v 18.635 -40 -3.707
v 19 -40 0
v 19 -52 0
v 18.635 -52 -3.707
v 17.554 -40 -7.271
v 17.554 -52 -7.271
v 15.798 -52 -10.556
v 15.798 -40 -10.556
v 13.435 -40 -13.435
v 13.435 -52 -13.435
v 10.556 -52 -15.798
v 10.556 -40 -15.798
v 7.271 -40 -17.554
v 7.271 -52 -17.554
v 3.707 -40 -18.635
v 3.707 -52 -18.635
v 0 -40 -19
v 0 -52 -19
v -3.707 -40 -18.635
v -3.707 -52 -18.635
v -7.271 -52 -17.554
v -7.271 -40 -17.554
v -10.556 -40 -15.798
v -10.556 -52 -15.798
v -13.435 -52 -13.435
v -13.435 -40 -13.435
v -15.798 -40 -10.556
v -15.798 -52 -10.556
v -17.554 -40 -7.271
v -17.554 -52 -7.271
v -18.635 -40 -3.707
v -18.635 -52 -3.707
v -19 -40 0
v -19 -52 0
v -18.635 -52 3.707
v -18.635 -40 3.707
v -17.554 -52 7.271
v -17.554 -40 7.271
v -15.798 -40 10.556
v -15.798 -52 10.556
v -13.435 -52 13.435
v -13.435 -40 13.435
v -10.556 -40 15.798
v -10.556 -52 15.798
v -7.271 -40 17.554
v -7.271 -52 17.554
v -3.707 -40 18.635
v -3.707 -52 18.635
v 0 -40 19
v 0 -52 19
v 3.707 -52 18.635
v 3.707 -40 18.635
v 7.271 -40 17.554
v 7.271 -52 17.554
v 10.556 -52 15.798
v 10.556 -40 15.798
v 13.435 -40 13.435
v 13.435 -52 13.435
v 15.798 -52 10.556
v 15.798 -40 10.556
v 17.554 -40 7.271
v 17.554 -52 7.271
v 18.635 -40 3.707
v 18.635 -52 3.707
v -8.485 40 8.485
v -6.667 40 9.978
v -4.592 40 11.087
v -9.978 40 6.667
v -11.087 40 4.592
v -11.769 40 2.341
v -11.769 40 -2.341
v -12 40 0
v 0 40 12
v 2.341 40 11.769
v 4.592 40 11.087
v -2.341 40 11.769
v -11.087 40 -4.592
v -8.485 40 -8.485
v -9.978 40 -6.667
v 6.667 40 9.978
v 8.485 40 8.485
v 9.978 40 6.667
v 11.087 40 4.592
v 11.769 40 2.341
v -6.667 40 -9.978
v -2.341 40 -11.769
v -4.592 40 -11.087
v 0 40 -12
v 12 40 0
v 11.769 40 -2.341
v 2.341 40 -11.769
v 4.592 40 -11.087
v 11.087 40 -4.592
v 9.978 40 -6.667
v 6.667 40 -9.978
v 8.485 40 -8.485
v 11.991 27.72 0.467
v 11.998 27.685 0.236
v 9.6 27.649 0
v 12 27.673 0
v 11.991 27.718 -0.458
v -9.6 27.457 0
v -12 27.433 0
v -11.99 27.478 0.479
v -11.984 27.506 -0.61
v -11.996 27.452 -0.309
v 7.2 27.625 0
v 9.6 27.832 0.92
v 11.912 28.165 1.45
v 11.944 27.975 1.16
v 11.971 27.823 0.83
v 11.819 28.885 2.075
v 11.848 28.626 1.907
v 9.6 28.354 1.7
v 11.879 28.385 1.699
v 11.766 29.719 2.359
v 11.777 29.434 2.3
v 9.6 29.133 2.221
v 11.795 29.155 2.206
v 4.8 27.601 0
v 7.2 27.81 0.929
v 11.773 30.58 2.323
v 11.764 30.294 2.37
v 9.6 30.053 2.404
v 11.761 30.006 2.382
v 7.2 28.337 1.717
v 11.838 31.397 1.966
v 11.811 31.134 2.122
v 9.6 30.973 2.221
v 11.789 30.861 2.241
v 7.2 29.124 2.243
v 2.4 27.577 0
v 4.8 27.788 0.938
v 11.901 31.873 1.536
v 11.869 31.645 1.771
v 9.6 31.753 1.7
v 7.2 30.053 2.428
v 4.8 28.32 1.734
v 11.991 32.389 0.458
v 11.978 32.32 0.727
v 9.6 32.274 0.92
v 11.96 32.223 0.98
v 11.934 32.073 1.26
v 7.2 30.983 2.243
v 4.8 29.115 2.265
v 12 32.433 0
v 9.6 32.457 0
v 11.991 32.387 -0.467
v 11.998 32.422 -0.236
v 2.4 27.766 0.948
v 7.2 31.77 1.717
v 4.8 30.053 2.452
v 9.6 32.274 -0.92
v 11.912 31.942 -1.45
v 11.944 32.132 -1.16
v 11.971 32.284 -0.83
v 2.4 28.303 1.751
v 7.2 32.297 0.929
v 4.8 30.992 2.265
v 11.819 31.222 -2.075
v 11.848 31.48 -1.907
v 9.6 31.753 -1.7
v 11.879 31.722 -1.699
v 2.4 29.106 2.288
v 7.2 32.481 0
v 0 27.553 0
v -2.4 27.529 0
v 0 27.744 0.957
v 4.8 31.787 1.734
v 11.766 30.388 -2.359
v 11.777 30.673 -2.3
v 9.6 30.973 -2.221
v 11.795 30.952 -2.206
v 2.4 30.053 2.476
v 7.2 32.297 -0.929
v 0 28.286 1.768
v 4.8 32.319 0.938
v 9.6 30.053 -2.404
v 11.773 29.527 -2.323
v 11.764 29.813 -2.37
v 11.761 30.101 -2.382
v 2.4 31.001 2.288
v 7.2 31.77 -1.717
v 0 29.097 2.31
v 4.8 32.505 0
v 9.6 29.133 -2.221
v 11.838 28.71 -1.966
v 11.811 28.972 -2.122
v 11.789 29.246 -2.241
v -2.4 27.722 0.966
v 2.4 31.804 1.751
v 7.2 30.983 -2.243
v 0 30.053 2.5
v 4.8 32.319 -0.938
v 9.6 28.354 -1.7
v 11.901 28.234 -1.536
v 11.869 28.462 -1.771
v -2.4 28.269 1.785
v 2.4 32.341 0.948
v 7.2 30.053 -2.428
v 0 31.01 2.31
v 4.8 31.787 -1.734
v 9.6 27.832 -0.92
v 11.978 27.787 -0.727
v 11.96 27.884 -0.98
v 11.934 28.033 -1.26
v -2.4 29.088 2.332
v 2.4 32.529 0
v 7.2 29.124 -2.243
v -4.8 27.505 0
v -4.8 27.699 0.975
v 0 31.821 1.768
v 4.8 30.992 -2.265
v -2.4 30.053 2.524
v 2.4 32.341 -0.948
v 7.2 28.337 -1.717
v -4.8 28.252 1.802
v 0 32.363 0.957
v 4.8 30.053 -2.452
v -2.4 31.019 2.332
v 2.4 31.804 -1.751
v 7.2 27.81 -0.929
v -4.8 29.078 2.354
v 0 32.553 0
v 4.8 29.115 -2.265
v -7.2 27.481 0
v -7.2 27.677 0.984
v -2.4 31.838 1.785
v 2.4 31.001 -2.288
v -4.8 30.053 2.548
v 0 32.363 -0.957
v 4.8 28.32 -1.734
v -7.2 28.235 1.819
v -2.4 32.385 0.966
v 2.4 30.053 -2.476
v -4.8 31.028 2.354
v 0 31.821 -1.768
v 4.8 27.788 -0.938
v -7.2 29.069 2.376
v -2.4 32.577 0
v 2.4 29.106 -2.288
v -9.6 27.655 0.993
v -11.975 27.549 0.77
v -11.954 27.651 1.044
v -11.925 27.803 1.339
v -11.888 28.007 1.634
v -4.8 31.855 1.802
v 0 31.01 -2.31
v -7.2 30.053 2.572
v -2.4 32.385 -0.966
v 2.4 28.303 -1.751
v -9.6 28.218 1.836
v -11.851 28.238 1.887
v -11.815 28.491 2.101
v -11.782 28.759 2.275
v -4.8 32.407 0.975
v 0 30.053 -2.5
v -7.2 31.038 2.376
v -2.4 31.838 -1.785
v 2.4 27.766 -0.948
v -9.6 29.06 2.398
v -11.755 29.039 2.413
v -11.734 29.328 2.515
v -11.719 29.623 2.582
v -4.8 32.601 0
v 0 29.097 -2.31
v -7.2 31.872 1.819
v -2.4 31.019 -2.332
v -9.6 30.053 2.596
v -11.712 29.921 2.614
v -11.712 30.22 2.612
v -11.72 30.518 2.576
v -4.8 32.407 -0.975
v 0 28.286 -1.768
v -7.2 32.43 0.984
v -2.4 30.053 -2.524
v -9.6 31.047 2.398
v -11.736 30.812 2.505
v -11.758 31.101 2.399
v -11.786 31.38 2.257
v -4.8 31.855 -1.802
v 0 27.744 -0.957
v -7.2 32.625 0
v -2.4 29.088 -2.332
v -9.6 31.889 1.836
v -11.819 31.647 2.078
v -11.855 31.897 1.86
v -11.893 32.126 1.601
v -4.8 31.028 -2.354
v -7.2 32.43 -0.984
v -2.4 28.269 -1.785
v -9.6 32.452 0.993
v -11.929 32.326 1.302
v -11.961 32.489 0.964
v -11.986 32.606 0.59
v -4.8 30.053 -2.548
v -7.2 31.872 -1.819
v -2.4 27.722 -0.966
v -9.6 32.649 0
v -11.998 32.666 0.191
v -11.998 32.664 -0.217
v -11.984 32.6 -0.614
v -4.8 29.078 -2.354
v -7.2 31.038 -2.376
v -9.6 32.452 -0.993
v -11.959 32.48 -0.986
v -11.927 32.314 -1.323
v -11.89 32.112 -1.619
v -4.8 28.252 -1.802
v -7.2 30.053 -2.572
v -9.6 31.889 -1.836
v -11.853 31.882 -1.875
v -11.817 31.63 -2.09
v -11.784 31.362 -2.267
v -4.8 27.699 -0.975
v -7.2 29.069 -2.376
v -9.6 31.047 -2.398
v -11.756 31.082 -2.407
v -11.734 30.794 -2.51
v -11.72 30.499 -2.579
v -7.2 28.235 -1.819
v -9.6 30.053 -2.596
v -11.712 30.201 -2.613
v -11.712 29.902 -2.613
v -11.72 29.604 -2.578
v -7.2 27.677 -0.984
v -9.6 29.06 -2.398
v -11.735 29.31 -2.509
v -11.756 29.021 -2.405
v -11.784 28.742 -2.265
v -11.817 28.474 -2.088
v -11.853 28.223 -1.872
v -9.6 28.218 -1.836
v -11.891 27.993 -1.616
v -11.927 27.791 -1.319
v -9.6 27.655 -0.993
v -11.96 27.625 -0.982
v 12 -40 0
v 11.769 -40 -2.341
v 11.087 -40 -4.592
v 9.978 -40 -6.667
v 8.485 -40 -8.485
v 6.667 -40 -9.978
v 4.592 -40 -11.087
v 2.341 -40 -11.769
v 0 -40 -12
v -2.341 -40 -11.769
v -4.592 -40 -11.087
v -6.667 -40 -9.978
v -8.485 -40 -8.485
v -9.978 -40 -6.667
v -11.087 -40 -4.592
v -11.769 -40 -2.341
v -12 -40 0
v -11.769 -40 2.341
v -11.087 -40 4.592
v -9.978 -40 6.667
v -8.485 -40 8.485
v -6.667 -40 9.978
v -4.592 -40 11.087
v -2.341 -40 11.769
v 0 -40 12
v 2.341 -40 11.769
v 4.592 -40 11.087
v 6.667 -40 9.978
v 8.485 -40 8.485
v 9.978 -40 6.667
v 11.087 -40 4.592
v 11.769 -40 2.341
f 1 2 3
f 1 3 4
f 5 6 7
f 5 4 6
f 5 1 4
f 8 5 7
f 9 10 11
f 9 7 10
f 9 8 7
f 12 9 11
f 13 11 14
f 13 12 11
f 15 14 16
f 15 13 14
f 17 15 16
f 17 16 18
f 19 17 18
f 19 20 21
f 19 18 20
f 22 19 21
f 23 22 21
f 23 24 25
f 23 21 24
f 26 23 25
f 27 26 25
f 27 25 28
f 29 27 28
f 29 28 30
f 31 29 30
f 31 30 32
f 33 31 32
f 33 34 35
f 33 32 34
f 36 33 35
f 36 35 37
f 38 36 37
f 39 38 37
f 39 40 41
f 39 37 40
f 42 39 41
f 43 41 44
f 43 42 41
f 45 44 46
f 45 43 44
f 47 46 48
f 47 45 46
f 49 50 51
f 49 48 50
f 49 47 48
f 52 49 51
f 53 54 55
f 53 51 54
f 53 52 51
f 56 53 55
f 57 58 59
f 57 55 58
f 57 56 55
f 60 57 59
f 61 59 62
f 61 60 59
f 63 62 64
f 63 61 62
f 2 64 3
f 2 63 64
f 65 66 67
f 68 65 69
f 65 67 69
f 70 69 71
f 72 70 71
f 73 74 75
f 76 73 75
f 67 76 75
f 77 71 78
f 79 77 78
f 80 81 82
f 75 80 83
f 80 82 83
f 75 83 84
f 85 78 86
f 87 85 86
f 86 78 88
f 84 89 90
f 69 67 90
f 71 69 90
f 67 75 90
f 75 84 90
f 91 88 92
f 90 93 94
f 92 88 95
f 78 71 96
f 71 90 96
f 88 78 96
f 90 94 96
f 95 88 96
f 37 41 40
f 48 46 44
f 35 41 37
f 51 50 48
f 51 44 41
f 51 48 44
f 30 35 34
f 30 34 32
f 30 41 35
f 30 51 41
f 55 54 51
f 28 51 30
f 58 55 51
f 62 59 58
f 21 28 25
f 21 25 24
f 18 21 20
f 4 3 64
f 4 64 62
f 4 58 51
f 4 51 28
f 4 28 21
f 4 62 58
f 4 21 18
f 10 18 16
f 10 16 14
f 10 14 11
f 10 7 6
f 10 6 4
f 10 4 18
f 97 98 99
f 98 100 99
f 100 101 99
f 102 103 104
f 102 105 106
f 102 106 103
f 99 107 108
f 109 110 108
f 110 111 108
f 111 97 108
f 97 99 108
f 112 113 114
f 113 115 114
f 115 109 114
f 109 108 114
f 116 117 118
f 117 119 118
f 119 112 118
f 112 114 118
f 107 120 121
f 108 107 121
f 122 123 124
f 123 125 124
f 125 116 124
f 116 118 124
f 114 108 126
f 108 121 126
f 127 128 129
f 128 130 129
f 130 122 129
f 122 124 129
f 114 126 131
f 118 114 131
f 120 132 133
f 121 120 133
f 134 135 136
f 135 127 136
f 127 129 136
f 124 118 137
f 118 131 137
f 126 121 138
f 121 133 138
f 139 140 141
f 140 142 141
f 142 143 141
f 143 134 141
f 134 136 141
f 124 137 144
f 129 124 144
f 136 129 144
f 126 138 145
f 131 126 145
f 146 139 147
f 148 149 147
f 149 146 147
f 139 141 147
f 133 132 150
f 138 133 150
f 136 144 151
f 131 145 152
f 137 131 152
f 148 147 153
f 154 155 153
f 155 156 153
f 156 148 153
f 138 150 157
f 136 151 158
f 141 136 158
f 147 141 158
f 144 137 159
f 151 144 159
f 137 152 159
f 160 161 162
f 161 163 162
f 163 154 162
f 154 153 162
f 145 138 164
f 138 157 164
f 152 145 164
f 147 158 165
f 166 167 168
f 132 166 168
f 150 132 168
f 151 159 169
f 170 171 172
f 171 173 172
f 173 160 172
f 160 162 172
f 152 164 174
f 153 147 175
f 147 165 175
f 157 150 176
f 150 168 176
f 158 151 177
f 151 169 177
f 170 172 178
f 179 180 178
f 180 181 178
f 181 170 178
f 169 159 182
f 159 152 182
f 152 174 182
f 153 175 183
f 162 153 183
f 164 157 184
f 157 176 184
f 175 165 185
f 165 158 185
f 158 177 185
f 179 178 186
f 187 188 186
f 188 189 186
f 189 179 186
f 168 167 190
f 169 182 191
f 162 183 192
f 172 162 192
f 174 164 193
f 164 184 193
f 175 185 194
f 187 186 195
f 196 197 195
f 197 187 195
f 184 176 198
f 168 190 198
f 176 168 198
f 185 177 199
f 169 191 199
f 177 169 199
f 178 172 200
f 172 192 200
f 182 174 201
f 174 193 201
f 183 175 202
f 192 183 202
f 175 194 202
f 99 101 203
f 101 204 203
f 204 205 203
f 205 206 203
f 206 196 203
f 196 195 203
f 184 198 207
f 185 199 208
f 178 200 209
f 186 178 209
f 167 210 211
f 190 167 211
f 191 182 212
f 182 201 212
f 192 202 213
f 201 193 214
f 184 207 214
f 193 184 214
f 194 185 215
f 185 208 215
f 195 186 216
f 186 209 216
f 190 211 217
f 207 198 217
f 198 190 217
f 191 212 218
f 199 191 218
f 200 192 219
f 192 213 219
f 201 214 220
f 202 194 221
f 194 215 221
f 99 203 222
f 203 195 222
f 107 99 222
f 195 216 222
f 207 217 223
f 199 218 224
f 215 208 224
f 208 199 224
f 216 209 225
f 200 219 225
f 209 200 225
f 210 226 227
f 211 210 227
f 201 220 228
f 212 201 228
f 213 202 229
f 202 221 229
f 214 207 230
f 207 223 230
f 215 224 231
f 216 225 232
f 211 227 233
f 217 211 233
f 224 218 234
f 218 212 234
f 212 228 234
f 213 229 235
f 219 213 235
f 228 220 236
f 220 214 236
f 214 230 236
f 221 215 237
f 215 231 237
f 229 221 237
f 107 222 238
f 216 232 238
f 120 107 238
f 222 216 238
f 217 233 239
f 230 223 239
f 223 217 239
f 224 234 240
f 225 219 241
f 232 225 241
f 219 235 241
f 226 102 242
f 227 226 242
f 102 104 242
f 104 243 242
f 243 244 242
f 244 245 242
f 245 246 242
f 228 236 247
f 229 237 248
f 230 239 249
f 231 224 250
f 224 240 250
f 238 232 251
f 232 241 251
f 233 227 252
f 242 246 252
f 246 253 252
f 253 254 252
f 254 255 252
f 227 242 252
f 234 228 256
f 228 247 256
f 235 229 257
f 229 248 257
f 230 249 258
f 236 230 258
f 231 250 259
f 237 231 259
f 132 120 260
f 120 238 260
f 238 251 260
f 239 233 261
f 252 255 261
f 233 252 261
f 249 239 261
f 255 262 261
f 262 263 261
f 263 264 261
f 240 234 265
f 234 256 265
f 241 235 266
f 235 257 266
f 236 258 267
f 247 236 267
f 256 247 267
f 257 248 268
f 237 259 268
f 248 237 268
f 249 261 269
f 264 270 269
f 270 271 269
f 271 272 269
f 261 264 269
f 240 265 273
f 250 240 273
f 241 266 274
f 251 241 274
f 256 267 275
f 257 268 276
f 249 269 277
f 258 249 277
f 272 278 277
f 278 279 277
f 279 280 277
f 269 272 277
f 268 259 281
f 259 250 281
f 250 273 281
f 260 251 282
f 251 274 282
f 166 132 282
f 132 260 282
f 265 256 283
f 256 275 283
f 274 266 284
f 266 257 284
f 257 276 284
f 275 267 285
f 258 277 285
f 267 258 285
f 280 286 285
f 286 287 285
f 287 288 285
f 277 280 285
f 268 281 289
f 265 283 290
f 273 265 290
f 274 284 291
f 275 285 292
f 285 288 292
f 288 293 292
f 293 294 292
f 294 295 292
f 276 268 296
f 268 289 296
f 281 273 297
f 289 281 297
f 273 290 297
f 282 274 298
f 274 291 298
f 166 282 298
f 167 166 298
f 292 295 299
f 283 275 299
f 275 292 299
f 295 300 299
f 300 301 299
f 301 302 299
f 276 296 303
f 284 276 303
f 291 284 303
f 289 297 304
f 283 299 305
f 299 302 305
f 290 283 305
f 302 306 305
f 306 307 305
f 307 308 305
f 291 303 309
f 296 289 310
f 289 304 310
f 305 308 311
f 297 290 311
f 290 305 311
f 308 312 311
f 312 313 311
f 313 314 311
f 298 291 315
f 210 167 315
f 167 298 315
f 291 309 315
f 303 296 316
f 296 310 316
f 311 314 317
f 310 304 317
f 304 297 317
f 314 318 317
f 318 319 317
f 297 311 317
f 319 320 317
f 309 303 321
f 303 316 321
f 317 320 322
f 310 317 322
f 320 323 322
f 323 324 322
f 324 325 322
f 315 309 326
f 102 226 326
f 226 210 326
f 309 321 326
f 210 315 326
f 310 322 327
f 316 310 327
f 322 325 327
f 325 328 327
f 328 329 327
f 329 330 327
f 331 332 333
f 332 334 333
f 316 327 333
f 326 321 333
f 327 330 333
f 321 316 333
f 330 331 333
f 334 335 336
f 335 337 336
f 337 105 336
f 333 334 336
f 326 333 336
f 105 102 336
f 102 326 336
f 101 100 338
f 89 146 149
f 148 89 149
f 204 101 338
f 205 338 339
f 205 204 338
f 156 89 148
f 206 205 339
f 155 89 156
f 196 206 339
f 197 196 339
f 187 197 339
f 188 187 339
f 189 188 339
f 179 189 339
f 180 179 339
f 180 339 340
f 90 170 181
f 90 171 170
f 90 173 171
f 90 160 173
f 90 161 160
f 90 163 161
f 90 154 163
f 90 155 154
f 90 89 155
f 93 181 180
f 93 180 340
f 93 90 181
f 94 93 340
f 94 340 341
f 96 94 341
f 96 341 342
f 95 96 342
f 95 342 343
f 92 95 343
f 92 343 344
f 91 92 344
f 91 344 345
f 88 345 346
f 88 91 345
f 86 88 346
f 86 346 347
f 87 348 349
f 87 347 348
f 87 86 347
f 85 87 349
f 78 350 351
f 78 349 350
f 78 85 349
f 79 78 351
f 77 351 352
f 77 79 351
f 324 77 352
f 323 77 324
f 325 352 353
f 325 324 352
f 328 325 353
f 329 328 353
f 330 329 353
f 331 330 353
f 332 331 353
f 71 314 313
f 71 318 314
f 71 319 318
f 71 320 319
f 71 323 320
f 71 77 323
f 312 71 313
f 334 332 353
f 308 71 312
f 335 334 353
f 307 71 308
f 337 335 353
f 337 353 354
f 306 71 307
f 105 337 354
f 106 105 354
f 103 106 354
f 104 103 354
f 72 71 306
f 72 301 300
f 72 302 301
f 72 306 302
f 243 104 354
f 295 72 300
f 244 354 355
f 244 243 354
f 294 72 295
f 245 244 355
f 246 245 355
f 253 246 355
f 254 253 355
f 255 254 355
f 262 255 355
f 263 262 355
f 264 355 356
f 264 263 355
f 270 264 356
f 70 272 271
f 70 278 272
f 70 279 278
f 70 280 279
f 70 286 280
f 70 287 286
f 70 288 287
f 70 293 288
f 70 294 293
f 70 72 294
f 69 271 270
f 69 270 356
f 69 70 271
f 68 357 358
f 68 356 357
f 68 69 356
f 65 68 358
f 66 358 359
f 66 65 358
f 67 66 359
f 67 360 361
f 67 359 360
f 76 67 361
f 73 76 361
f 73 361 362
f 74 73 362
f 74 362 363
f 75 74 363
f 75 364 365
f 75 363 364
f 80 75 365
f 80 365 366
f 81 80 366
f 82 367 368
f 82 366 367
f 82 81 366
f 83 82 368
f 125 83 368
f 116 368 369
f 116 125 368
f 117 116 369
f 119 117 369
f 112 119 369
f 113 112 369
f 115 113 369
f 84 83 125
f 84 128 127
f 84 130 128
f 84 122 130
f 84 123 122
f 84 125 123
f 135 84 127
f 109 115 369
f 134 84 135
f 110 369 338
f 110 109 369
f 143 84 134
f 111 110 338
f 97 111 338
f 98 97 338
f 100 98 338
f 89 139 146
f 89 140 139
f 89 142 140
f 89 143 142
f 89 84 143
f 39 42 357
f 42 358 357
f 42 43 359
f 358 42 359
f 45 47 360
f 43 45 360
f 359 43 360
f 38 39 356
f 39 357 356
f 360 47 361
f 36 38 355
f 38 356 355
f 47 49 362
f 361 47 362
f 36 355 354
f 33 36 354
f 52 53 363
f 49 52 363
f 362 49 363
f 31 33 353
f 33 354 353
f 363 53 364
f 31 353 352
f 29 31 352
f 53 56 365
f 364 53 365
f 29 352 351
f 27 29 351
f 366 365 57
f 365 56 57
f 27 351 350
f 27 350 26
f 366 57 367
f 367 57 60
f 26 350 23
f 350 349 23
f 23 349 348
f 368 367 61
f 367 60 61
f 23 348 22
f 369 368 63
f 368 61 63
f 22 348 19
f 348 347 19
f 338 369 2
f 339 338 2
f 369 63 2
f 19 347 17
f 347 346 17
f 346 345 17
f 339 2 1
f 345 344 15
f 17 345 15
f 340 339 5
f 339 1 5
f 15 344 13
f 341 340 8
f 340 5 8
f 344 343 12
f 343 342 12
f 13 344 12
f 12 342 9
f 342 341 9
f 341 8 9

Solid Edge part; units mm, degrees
sketch "Sketch1" plane through (0, 0, 0) normal (0, -1, 0) x (1, 0, 0)
  circle A0 centre (0, 0) radius 12
extrude "Protrusion1" add sketch "Sketch1" along normal mid plane 80
sketch "Sketch2" plane through (0, -40, 0) normal (0, -1, 0) x (1, 0, 0)
  circle A0 centre (0, 0) radius 19
extrude "ExtrudedProtrusion_3" add sketch "Sketch2" along normal blind 12
sketch "Sketch3" plane through (0, 0, 0) normal (0, 0, 1) x (1, 0, 0)
  line L0 (0, 30.0534) -> (22, 30.0534)
  line L1 (22, 30.0534) -> (22, 27.7734)
  line L2 (-22, 27.3334) -> (22, 27.7734)
  line L3 (-22, 30.0534) -> (-22, 27.3334)
  line L4 (0, 30.0534) -> (-22, 30.0534)
revolve "RevolvedCutout1" cut sketch "Sketch3" angle 360 about axis through (0, 30.0534, 0) along (1, 0, 0)
properties material "Mild Steel"
